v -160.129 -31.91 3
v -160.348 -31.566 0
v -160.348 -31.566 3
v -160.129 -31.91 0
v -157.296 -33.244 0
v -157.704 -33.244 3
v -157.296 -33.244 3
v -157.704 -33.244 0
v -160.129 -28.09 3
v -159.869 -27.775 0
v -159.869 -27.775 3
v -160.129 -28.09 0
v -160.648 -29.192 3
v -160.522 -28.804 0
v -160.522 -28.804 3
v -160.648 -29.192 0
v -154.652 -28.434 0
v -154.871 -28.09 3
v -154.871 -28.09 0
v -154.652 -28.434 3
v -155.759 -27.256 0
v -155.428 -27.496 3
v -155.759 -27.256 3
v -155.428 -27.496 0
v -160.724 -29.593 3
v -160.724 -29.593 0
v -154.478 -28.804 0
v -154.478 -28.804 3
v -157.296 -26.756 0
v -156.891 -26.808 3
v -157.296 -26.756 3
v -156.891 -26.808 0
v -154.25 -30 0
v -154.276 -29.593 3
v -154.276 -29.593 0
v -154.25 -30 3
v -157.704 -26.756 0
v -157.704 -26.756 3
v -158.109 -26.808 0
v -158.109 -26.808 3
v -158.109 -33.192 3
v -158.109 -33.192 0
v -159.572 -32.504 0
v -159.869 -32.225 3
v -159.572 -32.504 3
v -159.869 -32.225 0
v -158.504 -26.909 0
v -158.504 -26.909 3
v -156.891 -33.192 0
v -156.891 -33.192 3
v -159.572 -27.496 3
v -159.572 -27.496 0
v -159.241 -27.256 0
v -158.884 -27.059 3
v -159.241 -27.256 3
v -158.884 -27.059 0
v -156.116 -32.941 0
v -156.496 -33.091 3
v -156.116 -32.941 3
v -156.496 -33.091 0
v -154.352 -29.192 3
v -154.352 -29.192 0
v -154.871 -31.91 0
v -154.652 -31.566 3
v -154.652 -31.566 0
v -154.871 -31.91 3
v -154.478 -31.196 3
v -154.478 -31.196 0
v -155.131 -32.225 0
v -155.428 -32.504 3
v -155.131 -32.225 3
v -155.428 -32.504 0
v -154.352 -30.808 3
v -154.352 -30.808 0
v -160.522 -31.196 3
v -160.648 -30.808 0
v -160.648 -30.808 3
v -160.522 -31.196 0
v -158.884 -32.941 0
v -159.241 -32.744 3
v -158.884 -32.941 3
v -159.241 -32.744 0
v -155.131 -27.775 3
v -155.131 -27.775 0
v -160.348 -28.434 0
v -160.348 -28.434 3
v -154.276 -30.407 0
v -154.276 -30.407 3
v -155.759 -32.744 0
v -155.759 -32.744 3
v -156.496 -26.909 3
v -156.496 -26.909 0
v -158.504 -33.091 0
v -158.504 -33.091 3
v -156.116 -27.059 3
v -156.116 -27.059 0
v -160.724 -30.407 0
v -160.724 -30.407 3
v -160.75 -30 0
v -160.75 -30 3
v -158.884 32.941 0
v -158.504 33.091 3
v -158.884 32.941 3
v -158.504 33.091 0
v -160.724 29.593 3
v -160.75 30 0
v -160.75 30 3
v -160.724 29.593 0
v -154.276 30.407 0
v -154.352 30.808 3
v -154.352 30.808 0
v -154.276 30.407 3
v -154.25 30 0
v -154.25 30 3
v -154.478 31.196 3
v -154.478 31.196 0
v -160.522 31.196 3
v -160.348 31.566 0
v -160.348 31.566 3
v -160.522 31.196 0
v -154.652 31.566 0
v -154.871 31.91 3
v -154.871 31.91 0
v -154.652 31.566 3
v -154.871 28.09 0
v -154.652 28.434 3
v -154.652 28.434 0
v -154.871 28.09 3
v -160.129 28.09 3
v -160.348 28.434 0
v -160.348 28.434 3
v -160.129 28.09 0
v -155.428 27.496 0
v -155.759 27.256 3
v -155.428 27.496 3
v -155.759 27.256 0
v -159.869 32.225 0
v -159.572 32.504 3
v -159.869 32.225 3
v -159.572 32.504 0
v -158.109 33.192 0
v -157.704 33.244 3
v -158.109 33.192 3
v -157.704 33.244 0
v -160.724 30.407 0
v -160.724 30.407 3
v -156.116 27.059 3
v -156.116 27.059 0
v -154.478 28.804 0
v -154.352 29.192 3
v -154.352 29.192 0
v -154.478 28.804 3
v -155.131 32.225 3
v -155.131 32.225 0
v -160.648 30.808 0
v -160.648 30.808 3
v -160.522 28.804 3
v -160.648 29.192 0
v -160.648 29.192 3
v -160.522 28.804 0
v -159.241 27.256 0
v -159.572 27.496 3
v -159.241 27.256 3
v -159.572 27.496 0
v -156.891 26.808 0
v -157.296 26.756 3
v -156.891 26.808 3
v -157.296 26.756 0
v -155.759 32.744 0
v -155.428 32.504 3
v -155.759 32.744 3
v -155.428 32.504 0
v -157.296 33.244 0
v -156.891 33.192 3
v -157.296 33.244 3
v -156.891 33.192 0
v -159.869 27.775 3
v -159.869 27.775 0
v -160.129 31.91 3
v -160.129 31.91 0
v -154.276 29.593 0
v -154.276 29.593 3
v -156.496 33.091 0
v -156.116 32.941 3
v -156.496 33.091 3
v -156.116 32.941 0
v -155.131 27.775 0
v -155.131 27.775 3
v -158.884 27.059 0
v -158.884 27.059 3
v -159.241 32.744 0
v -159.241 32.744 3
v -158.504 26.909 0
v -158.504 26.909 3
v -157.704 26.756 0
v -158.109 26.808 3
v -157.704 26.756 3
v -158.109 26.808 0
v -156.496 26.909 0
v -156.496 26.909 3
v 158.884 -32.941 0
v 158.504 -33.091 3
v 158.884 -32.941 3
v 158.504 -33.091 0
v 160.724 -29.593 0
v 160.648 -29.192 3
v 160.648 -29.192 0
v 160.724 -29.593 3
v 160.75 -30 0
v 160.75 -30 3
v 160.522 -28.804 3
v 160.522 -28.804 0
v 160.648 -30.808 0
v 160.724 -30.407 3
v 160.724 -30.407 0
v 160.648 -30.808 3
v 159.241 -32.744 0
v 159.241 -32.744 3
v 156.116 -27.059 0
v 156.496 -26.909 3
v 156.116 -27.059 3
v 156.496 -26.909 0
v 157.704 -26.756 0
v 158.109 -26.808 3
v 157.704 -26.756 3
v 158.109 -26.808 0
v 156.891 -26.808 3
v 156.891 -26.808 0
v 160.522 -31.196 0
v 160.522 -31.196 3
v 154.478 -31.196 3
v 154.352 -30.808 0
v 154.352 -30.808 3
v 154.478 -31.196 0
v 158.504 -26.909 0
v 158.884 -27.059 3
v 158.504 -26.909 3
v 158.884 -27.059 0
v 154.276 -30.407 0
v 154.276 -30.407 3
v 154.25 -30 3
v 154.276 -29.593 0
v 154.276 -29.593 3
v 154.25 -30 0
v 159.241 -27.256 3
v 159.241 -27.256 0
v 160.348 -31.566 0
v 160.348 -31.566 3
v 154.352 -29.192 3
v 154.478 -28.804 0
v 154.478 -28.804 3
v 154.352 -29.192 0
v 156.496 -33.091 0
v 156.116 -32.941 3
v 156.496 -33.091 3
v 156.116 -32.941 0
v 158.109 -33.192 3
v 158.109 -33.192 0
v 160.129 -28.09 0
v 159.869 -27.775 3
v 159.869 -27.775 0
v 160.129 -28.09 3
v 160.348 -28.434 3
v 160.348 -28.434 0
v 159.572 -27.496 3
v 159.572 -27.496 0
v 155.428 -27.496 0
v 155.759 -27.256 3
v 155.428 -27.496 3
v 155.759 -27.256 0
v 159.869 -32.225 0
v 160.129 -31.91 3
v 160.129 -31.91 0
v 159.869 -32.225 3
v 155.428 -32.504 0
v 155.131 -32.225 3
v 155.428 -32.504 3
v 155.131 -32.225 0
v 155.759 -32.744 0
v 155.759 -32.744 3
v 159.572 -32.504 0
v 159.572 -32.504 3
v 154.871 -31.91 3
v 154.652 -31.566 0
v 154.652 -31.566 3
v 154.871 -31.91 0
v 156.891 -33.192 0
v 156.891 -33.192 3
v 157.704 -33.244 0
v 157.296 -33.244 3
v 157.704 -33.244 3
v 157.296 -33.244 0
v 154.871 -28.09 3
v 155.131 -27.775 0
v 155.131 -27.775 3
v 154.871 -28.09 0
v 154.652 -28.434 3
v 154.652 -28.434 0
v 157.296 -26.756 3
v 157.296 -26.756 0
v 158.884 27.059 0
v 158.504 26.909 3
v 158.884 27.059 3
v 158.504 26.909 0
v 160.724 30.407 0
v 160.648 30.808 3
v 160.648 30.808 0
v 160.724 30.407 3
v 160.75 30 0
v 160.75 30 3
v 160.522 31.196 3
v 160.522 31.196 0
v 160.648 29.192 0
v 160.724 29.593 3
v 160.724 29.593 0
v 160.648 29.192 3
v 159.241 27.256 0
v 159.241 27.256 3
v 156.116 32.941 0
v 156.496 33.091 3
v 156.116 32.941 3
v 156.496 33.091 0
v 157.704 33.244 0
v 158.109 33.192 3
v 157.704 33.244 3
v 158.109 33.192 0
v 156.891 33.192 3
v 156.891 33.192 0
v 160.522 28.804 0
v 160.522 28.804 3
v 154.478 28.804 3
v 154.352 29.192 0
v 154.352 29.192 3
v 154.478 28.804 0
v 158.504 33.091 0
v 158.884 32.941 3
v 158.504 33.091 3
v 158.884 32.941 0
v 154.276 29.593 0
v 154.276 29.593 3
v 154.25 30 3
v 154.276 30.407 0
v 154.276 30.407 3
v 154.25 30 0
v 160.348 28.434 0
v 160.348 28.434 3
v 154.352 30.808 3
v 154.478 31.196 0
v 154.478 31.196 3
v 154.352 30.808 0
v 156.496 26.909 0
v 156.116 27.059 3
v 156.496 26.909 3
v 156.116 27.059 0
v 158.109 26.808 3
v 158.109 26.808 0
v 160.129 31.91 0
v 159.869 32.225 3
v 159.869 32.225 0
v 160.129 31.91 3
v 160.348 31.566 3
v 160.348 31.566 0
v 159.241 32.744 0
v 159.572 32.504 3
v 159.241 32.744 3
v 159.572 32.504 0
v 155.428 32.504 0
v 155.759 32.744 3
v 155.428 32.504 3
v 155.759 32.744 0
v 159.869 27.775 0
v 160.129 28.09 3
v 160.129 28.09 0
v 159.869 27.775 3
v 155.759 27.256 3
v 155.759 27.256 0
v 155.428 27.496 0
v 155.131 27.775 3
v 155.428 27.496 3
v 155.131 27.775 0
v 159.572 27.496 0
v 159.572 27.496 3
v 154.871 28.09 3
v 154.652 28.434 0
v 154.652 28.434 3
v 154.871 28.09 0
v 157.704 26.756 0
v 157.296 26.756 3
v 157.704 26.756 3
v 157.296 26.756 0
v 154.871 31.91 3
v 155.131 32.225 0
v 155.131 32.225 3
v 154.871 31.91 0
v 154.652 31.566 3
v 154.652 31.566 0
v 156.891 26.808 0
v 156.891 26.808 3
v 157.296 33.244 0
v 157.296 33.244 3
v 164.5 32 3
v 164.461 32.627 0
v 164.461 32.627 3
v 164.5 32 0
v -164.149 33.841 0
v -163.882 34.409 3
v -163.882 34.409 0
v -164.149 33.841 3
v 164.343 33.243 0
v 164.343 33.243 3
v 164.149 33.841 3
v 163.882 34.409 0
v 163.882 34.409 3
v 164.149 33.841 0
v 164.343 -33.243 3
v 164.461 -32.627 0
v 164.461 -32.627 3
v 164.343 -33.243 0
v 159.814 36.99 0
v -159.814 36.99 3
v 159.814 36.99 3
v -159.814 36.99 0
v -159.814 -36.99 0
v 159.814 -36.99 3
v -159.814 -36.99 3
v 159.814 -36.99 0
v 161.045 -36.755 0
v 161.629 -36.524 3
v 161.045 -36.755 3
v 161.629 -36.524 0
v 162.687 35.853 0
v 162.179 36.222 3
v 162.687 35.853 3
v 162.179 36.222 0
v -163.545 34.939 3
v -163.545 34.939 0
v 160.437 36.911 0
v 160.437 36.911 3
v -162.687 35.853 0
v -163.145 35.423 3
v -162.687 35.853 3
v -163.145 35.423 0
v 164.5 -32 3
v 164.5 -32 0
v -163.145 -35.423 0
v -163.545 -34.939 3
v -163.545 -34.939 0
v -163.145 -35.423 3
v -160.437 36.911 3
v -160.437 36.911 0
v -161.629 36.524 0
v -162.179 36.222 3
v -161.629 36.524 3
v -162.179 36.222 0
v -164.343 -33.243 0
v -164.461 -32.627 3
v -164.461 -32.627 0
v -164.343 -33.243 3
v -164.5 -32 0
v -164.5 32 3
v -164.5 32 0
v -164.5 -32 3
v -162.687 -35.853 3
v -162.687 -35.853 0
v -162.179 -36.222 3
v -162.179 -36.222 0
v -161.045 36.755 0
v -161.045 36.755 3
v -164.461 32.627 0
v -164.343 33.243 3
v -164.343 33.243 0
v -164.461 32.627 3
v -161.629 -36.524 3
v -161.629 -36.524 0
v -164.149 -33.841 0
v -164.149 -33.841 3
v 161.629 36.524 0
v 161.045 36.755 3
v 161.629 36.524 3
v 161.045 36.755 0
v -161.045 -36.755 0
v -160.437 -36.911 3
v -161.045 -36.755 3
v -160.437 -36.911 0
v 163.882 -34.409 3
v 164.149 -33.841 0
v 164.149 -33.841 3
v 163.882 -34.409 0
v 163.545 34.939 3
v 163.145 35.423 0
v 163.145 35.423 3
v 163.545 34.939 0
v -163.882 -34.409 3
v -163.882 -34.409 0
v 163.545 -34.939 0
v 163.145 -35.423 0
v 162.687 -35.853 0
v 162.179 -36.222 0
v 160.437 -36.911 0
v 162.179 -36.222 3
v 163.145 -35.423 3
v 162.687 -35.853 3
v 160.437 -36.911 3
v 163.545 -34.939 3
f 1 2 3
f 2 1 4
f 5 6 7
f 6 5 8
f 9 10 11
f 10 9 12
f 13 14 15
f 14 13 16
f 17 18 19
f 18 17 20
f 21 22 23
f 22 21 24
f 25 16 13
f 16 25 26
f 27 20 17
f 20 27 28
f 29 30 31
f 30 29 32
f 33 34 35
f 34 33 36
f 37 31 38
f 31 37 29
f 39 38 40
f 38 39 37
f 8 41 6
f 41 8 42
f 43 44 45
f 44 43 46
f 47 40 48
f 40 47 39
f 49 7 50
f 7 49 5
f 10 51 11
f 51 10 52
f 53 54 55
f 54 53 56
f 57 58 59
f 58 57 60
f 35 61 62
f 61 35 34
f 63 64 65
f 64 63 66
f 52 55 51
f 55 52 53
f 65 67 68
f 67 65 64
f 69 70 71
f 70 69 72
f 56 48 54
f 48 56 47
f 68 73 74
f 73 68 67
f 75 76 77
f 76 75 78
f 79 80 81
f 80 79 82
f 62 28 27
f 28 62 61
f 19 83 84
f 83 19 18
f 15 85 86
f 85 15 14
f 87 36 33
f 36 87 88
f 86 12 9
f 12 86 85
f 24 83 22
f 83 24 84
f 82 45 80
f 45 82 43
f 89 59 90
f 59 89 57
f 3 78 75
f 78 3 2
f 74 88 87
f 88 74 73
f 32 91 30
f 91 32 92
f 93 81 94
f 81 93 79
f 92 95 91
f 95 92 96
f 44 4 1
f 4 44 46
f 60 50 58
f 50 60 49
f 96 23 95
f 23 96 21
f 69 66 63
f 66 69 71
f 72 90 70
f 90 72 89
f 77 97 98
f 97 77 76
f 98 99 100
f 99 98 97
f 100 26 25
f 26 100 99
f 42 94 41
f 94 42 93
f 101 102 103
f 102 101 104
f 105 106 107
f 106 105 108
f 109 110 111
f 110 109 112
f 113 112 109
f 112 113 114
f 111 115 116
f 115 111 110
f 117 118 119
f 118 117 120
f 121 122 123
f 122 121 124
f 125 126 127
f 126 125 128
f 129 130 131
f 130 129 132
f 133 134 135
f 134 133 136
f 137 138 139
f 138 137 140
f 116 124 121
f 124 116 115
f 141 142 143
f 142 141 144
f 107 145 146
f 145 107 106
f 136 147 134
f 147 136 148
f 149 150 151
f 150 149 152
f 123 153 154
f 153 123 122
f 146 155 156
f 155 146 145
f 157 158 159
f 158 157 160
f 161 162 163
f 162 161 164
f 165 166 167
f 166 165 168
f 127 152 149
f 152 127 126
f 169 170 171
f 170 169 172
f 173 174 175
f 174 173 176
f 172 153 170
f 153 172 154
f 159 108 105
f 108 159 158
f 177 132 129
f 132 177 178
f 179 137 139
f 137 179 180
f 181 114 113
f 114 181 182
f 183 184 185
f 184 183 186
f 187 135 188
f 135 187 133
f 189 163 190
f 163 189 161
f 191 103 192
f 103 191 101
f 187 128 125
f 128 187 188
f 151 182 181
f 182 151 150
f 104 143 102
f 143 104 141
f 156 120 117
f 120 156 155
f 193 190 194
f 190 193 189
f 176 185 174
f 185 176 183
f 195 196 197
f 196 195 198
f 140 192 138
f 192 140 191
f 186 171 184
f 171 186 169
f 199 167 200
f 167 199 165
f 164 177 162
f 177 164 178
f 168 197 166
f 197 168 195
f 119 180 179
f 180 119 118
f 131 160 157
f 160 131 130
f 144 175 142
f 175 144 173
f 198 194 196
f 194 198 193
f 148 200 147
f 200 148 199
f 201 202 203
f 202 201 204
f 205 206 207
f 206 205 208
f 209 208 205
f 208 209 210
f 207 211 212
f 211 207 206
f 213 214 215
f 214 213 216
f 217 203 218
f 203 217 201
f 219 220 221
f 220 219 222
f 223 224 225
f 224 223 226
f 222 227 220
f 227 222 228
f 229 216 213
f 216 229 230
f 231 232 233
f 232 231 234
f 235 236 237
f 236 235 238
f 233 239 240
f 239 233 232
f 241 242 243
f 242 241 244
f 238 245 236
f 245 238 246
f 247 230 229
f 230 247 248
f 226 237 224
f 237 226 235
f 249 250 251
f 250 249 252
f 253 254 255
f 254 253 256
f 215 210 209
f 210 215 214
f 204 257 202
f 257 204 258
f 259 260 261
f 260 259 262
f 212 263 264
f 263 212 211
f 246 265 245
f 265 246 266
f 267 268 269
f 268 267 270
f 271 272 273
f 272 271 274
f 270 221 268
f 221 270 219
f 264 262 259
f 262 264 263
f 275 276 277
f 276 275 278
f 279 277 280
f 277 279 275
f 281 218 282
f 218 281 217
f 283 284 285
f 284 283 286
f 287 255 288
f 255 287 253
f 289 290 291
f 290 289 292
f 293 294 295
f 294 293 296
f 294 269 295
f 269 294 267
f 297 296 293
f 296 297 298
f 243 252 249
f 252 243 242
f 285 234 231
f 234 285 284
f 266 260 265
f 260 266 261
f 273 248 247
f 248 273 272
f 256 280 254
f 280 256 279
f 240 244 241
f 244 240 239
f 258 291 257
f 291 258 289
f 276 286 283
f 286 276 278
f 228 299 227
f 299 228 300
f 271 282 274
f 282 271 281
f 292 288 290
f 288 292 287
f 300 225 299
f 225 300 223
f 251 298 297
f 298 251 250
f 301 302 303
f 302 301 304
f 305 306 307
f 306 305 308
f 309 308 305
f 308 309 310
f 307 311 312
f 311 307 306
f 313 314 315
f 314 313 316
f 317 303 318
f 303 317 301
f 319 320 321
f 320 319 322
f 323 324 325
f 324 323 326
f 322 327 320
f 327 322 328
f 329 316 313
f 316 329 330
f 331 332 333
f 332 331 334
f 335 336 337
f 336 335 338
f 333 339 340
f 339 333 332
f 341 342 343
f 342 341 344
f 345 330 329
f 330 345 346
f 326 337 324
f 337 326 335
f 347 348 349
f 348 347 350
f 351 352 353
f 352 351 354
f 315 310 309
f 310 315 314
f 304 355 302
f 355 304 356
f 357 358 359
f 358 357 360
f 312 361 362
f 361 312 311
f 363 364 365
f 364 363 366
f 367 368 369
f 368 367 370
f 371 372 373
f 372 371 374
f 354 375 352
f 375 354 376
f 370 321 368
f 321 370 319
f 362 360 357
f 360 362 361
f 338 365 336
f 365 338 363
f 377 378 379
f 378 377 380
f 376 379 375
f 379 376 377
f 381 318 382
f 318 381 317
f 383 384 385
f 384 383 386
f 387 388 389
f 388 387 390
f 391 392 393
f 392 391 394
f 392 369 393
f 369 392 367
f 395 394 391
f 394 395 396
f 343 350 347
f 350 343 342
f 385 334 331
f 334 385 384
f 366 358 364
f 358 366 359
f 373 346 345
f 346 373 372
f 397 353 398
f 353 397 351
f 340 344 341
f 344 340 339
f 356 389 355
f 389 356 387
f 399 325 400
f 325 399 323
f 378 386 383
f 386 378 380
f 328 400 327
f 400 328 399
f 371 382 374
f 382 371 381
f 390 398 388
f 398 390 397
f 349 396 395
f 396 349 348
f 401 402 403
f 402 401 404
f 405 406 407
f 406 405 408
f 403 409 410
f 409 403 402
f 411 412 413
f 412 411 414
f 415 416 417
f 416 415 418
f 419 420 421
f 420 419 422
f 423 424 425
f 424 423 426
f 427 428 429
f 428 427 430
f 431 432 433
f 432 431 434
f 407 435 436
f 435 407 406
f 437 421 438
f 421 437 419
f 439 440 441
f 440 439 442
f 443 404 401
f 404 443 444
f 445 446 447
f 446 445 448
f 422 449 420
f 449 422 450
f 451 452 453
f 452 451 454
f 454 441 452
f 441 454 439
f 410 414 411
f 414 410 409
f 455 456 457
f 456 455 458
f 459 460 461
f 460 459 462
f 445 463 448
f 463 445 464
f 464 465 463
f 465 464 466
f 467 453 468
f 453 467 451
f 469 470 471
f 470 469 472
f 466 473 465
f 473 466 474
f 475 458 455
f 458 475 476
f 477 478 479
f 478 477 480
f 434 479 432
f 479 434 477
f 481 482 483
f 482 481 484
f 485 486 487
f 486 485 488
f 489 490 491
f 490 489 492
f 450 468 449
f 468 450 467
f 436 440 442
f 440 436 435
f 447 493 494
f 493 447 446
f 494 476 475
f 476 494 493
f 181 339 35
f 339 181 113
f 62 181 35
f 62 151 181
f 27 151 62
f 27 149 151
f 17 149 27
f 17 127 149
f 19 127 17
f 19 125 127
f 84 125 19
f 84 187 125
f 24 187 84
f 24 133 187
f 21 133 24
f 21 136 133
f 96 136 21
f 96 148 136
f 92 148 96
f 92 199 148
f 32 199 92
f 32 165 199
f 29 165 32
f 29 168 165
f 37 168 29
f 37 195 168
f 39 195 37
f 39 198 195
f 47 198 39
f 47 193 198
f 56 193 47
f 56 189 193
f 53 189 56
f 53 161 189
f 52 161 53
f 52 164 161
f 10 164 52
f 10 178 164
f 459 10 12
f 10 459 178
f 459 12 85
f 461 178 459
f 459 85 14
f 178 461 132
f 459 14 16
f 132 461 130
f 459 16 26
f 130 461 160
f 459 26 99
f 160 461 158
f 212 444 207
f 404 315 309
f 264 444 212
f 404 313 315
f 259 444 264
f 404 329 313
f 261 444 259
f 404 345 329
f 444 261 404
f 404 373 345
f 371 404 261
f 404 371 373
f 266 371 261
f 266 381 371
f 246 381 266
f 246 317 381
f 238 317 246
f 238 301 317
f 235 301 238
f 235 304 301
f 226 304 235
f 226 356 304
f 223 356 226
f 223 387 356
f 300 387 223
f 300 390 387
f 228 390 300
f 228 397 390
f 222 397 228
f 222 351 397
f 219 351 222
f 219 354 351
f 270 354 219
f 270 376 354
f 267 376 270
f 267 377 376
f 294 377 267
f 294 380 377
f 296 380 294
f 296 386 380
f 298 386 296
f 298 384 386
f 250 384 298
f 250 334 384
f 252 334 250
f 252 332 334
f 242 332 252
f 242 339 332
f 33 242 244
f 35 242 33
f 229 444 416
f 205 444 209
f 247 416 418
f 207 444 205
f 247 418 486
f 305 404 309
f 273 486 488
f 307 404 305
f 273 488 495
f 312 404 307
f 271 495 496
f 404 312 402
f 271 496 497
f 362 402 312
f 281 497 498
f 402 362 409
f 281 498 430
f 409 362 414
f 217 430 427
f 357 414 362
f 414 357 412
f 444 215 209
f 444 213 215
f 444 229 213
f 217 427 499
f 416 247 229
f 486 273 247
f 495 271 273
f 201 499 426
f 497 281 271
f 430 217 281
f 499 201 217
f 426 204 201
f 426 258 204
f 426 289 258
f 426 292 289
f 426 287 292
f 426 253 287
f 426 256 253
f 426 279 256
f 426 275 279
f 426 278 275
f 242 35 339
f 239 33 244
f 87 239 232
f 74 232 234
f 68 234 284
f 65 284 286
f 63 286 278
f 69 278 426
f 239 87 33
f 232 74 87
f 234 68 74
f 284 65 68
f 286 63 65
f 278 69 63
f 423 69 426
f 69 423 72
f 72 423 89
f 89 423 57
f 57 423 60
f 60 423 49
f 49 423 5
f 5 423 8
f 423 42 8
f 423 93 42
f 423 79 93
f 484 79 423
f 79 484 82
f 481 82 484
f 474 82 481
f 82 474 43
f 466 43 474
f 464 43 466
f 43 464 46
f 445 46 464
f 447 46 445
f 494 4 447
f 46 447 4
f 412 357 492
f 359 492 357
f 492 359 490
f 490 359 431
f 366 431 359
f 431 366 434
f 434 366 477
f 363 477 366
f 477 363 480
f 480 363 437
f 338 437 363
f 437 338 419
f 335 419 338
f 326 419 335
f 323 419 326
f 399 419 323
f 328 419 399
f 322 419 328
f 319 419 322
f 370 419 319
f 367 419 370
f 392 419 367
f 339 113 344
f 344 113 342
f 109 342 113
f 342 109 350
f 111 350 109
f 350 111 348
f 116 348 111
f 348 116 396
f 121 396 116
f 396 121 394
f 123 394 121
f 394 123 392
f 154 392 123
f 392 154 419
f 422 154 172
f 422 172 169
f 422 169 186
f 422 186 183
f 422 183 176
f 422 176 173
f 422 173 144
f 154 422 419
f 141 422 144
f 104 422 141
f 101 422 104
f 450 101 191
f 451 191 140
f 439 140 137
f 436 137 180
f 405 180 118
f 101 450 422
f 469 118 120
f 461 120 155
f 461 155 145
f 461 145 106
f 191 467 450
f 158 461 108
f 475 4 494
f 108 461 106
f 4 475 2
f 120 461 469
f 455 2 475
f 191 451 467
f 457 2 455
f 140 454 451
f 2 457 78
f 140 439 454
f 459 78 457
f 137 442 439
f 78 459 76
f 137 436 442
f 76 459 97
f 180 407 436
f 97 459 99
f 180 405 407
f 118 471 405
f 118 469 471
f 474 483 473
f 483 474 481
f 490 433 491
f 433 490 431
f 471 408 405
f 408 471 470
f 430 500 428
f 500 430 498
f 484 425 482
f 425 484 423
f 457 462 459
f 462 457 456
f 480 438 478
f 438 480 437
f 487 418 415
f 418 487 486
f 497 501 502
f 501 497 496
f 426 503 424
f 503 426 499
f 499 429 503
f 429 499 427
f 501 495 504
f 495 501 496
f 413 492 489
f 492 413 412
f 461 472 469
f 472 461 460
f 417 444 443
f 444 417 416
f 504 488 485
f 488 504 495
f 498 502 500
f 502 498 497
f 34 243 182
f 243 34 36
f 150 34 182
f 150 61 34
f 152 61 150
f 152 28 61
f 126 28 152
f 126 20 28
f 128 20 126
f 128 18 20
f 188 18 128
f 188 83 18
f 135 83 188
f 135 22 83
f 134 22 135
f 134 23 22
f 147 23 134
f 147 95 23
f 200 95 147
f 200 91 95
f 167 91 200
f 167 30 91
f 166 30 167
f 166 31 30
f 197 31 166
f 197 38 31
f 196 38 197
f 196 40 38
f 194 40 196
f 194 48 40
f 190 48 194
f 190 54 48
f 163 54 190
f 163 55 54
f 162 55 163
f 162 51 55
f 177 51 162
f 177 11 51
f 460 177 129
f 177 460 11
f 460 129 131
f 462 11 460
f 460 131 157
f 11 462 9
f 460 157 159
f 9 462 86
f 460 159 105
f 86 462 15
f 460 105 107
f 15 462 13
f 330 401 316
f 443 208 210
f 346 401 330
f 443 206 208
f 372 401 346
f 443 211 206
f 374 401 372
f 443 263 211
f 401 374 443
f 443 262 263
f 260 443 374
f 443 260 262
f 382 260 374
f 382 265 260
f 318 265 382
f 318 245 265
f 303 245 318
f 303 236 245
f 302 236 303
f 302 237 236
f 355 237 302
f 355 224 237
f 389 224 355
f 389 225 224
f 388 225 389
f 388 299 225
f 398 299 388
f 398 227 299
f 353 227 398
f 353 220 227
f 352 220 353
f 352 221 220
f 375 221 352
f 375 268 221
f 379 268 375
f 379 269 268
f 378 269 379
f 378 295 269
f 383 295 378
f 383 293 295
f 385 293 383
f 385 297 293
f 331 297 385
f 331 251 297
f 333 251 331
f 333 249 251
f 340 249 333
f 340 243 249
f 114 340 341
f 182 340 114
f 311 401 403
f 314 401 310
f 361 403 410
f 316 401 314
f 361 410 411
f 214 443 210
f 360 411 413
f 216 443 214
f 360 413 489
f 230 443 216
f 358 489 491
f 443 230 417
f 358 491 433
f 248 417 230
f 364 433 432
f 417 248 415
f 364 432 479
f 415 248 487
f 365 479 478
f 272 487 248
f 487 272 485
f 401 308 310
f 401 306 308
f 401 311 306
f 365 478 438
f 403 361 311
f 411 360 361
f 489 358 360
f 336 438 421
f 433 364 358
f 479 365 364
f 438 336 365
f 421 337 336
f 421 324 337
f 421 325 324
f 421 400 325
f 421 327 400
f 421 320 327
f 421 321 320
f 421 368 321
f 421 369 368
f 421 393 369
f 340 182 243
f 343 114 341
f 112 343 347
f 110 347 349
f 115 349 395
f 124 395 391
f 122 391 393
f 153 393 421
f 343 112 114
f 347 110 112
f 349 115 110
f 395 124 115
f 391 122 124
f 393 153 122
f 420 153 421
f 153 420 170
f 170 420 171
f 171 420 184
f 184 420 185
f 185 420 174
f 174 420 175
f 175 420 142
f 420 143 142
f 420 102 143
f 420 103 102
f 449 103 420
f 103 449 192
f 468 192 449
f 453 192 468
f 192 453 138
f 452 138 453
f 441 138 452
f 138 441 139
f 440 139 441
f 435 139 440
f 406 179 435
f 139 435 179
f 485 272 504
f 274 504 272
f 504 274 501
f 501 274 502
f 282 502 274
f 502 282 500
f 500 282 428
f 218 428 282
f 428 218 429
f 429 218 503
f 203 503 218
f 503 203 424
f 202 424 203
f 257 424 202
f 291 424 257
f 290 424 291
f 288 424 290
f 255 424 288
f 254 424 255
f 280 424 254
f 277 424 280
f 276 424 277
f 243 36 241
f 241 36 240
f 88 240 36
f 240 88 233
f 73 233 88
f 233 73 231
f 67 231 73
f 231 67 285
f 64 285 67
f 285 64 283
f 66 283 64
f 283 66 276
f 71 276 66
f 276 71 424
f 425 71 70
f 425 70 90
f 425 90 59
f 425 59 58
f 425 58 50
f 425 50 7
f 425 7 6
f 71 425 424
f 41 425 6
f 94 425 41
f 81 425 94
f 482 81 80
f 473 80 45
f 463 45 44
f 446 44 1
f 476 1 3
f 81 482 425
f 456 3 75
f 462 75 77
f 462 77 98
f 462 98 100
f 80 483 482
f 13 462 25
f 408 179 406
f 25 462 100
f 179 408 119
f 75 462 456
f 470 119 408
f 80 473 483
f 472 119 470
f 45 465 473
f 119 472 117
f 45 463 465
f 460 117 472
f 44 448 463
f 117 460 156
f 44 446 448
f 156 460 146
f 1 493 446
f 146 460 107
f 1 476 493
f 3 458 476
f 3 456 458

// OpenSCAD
$fn = 50;


difference() {
	union() {
		hull() {
			translate(v = [-159.5000000000, 32.0000000000, 0]) {
				cylinder(h = 3, r = 5);
			}
			translate(v = [159.5000000000, 32.0000000000, 0]) {
				cylinder(h = 3, r = 5);
			}
			translate(v = [-159.5000000000, -32.0000000000, 0]) {
				cylinder(h = 3, r = 5);
			}
			translate(v = [159.5000000000, -32.0000000000, 0]) {
				cylinder(h = 3, r = 5);
			}
		}
	}
	union() {
		translate(v = [-157.5000000000, -30.0000000000, -100.0000000000]) {
			cylinder(h = 200, r = 3.2500000000);
		}
		translate(v = [-157.5000000000, 30.0000000000, -100.0000000000]) {
			cylinder(h = 200, r = 3.2500000000);
		}
		translate(v = [157.5000000000, -30.0000000000, -100.0000000000]) {
			cylinder(h = 200, r = 3.2500000000);
		}
		translate(v = [157.5000000000, 30.0000000000, -100.0000000000]) {
			cylinder(h = 200, r = 3.2500000000);
		}
	}
}
